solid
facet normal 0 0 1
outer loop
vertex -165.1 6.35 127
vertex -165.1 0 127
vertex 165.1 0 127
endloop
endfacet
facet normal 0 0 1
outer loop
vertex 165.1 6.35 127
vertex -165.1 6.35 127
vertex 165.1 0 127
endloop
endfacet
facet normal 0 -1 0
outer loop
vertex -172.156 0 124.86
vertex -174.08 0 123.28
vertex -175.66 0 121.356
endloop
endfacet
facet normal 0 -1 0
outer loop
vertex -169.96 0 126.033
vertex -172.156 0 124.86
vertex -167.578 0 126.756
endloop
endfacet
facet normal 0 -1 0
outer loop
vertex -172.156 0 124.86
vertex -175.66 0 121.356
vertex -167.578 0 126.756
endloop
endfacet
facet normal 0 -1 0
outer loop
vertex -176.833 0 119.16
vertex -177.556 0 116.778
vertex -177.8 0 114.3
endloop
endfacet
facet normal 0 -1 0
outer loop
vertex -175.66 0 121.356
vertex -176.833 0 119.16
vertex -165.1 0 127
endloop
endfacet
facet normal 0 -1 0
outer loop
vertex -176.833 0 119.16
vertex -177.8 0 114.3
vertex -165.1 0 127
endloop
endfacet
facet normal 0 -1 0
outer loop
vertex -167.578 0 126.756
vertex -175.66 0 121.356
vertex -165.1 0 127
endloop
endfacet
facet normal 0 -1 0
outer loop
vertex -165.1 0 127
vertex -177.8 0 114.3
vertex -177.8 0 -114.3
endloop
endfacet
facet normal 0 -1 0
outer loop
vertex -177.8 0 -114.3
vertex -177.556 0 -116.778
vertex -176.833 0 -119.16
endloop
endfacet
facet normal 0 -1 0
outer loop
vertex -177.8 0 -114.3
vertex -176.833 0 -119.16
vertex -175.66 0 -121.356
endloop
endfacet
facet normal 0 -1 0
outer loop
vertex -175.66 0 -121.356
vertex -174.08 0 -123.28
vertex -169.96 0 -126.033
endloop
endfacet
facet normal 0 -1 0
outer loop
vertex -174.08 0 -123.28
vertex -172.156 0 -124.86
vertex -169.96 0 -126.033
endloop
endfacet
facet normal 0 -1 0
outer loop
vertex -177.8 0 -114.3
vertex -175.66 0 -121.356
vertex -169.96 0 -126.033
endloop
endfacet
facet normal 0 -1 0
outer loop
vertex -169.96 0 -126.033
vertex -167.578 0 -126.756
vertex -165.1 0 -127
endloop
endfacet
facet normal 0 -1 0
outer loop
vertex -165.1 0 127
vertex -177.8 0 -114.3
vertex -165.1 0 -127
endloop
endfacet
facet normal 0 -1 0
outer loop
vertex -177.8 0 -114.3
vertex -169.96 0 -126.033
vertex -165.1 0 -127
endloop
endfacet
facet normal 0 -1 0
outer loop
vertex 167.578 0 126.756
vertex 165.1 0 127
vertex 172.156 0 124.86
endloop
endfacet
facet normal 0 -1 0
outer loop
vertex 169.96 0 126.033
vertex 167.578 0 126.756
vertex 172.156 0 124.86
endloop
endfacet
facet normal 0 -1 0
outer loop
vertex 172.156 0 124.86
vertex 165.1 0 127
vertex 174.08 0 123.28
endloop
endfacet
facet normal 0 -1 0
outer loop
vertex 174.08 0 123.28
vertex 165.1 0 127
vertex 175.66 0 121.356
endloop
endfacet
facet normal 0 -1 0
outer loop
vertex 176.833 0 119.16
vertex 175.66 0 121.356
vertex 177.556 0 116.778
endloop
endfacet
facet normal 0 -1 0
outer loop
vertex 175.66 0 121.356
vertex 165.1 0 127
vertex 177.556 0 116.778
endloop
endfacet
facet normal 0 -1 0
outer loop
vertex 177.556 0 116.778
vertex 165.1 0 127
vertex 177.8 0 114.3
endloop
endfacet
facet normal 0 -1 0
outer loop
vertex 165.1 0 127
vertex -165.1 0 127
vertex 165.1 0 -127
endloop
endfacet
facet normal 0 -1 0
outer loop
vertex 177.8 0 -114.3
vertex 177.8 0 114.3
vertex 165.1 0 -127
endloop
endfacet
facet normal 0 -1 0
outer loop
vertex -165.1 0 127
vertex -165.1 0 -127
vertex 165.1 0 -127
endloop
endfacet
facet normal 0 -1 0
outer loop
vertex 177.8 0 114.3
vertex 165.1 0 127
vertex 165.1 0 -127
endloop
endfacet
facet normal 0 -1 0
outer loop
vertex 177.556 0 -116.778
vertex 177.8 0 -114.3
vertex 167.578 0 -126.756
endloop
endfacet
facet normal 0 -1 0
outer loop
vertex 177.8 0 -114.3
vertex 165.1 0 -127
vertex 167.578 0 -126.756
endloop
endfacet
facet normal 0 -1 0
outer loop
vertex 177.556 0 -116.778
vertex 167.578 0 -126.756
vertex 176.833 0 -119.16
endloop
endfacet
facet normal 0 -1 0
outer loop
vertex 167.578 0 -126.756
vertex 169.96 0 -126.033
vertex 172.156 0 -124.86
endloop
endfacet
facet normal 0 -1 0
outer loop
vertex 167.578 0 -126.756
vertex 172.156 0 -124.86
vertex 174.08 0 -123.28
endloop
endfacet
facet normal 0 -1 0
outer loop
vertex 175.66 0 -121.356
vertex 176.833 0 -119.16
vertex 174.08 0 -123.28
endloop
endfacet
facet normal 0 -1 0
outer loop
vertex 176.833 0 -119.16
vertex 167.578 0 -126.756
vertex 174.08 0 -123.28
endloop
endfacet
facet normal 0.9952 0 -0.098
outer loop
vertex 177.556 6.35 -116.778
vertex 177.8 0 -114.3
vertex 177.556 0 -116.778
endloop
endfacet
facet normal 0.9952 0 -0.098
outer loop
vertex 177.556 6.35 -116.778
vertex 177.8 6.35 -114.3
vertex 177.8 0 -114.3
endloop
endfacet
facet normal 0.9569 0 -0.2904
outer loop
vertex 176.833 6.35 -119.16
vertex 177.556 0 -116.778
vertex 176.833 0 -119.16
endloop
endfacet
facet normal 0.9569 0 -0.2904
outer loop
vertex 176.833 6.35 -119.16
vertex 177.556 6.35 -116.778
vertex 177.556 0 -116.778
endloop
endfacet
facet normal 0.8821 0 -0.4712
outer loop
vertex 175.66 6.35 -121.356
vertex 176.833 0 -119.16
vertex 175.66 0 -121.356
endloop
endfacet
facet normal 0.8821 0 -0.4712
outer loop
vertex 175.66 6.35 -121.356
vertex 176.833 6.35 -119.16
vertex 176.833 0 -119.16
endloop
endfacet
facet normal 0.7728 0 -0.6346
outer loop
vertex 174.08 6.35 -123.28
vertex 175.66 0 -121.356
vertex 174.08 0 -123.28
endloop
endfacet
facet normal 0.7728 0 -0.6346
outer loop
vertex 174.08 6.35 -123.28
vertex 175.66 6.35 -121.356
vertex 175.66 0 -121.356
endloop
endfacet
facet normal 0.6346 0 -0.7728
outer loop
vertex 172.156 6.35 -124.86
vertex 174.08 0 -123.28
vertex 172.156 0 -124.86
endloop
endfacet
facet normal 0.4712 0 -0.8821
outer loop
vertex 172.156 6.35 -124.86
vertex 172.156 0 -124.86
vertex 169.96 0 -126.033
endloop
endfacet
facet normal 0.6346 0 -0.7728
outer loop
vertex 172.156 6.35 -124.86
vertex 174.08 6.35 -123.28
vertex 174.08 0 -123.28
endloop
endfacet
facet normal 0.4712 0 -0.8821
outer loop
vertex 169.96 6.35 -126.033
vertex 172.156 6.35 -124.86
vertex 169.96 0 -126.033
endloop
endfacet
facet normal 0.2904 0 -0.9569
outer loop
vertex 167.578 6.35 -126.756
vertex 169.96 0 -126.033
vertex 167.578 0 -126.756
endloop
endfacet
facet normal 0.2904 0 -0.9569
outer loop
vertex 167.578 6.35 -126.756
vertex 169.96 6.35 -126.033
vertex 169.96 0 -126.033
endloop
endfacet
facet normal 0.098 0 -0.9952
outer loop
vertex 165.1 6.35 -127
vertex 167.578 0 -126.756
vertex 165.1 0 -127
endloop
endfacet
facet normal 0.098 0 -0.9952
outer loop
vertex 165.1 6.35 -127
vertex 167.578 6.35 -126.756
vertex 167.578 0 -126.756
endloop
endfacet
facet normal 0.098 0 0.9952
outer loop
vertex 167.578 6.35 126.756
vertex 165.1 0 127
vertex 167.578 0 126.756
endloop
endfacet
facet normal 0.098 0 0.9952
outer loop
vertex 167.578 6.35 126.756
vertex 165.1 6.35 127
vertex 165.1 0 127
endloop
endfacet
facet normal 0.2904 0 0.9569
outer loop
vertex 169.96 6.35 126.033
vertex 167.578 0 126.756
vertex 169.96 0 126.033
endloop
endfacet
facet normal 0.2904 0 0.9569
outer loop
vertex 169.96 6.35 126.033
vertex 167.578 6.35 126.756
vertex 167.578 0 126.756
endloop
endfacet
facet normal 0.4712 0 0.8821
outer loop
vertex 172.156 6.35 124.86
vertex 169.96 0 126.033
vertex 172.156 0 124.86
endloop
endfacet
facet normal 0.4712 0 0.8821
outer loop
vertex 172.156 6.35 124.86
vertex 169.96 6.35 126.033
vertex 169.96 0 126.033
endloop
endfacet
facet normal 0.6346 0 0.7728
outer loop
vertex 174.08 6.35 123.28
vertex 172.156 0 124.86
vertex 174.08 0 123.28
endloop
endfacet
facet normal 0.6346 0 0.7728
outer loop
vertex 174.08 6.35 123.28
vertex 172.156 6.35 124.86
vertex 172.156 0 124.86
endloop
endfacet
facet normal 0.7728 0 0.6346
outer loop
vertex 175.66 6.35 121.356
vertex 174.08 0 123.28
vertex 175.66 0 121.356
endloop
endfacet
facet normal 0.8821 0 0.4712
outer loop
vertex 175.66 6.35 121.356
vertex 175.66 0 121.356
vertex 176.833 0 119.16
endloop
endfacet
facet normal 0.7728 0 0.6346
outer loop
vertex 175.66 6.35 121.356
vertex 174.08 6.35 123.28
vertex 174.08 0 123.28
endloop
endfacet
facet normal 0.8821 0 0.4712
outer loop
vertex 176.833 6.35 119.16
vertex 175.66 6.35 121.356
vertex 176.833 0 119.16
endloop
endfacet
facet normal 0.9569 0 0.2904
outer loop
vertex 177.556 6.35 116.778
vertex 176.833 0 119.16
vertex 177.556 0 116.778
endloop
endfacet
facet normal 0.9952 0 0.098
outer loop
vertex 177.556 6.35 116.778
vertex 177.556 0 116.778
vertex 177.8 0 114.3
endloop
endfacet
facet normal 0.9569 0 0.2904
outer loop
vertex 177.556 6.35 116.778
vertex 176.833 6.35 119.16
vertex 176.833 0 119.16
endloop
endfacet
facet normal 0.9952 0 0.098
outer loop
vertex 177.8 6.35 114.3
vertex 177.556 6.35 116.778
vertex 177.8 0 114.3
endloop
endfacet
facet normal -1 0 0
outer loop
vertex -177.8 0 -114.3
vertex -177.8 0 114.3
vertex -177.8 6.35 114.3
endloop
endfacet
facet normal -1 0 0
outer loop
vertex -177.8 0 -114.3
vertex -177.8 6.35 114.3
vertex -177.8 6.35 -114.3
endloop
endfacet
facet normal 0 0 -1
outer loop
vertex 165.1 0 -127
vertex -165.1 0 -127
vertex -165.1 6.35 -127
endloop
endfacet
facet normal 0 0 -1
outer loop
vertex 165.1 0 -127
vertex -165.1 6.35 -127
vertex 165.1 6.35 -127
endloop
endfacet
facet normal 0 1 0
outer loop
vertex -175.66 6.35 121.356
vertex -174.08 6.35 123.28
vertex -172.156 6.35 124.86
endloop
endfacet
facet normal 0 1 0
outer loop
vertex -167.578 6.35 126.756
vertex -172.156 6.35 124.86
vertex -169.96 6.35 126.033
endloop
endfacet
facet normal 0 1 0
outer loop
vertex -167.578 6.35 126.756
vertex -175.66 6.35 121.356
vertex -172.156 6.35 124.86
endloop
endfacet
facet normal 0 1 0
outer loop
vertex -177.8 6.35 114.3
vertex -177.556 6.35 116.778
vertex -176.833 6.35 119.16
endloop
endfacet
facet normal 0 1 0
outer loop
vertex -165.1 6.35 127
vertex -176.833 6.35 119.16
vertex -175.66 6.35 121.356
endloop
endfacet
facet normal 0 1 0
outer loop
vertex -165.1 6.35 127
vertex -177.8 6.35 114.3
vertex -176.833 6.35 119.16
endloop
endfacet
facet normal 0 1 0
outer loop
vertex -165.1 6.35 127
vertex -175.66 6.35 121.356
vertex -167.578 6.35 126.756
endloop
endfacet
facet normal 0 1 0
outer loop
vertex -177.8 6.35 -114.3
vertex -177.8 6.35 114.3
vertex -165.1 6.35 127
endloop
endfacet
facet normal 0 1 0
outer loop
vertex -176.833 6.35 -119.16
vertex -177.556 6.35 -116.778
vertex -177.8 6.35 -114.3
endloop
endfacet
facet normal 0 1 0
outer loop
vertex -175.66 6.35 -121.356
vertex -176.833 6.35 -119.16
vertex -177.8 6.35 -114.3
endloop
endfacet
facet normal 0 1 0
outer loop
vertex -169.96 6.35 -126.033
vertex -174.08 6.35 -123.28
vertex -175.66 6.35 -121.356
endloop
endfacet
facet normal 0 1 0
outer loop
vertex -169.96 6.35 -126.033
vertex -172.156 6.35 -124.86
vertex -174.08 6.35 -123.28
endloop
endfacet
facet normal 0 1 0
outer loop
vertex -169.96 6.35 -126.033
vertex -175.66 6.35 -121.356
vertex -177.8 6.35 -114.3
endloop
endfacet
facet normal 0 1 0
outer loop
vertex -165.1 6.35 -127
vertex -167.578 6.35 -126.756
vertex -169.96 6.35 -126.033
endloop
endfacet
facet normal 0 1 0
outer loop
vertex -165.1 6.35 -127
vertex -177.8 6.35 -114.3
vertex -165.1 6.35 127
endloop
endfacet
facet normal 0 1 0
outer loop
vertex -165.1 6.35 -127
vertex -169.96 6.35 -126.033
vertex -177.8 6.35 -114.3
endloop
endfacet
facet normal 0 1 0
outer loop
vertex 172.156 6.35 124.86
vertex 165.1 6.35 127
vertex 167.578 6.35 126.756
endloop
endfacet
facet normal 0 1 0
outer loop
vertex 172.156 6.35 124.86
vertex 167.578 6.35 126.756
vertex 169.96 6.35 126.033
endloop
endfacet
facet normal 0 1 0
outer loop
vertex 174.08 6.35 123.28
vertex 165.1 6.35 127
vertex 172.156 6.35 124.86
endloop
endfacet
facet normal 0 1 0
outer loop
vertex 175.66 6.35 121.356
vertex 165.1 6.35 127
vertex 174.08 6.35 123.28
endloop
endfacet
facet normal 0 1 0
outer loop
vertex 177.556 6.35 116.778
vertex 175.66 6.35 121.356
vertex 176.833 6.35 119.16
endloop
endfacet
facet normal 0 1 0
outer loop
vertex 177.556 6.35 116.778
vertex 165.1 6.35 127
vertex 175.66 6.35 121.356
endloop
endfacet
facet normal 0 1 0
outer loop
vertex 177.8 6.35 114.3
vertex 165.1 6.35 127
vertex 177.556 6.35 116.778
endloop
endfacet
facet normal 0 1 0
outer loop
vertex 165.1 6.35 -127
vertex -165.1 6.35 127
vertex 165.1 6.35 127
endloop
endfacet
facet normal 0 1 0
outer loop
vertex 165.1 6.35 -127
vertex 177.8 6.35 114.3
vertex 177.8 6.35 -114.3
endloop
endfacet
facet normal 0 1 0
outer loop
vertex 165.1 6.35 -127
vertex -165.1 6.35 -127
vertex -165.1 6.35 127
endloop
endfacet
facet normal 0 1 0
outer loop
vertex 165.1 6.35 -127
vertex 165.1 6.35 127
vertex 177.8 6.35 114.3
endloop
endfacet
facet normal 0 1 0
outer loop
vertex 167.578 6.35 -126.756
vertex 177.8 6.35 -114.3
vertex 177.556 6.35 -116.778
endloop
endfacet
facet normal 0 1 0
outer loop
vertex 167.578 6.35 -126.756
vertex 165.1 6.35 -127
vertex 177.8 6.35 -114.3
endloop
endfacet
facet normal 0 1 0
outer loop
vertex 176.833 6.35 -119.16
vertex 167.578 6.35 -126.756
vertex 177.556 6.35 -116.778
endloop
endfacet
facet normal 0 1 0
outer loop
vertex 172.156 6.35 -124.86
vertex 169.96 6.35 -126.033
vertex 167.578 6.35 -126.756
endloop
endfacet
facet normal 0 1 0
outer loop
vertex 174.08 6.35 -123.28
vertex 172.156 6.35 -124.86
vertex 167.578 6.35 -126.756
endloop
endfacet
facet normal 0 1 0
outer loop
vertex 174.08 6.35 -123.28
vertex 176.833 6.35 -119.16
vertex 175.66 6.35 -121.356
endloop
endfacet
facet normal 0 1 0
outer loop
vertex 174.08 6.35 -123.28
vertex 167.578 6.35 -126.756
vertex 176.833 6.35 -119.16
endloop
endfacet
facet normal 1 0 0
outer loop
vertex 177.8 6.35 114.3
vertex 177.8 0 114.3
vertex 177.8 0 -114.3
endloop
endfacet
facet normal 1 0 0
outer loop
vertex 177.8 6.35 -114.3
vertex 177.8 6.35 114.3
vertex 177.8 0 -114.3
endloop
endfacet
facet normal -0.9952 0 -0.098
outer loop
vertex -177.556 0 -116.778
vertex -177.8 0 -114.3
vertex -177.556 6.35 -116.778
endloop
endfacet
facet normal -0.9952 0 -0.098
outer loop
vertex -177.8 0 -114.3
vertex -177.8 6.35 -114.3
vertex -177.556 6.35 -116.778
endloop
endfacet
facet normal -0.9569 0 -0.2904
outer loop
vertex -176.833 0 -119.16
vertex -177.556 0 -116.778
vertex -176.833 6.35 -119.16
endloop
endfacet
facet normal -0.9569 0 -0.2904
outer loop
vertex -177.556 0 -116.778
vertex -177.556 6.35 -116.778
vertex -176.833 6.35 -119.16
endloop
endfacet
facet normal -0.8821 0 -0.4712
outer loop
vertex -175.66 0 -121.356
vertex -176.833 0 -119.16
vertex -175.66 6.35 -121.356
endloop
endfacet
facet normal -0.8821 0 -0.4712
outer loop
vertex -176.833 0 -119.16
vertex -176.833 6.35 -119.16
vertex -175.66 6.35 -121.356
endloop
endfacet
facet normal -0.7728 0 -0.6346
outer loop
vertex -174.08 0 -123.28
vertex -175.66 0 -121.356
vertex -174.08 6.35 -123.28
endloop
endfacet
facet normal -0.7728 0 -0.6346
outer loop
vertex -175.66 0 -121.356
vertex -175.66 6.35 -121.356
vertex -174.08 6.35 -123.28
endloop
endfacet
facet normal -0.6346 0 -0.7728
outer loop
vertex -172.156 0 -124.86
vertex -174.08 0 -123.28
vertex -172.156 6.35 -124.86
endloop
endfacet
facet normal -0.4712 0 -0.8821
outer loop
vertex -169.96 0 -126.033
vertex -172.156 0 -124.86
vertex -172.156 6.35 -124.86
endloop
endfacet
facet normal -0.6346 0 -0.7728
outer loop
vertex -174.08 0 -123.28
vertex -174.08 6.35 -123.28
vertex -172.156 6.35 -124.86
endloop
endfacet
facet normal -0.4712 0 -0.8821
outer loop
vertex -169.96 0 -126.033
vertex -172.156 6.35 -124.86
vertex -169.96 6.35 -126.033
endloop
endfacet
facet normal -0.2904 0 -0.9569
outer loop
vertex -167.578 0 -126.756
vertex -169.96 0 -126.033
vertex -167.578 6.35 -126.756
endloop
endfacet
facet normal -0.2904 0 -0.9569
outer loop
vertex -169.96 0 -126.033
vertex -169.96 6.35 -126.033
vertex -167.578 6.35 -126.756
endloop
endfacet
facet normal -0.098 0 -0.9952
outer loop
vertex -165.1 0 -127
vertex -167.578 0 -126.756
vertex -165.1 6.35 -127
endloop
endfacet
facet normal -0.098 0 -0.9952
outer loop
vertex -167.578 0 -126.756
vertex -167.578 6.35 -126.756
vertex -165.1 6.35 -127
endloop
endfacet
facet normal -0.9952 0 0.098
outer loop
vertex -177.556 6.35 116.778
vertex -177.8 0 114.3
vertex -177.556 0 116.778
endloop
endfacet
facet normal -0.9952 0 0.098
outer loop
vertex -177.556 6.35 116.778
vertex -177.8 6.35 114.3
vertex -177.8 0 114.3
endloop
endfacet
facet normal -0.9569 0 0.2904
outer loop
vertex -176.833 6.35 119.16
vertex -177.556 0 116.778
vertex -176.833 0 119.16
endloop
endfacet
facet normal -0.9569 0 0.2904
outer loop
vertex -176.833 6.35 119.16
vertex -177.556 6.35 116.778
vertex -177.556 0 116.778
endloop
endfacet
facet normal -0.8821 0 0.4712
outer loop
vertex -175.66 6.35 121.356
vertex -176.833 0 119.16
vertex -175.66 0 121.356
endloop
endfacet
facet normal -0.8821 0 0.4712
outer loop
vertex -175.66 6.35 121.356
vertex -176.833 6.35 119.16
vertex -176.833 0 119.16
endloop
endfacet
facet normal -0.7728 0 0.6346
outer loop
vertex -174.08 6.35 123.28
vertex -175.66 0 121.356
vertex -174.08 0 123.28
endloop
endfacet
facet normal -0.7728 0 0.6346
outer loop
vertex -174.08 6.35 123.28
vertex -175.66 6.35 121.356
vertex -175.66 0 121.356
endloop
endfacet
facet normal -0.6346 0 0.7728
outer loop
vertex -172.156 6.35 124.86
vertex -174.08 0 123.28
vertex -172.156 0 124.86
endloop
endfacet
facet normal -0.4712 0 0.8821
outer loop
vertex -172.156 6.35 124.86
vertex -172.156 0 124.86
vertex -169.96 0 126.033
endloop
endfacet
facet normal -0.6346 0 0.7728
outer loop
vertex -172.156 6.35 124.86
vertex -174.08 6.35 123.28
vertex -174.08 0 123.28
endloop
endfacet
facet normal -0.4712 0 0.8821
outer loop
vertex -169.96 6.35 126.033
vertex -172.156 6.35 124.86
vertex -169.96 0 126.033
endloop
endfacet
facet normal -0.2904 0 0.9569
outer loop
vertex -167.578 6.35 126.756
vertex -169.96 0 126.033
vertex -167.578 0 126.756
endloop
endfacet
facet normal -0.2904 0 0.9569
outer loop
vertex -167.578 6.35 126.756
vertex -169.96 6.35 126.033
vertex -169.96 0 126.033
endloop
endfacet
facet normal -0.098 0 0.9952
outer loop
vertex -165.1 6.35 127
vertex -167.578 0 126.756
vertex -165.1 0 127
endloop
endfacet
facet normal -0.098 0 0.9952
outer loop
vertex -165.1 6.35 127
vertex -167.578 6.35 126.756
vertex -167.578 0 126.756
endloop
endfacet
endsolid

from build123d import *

# Parameters (mm, degrees)
ESQUISSE1_W        = 355.6
ESQUISSE1_H        = 254
BOSS_EXTRU_1_DEPTH = 6.35
CONG_1_R           = 12.7


with BuildPart() as part:
    # Esquisse1 → Boss.-Extru.1 (new body)
    with BuildSketch(Plane(origin=(0, 0, 0), x_dir=(1, 0, 0), z_dir=(0, 1, 0))):
        Rectangle(ESQUISSE1_W, ESQUISSE1_H)
    extrude(amount=BOSS_EXTRU_1_DEPTH)

    # Congé1
    cong_1_edges = [part.edges().sort_by_distance(p)[0] for p in [
        (177.8, 3.175, 127),
        (-177.8, 3.175, 127),
        (-177.8, 3.175, -127),
        (177.8, 3.175, -127),
    ]]
    fillet(cong_1_edges, radius=CONG_1_R)


solid = part.part
